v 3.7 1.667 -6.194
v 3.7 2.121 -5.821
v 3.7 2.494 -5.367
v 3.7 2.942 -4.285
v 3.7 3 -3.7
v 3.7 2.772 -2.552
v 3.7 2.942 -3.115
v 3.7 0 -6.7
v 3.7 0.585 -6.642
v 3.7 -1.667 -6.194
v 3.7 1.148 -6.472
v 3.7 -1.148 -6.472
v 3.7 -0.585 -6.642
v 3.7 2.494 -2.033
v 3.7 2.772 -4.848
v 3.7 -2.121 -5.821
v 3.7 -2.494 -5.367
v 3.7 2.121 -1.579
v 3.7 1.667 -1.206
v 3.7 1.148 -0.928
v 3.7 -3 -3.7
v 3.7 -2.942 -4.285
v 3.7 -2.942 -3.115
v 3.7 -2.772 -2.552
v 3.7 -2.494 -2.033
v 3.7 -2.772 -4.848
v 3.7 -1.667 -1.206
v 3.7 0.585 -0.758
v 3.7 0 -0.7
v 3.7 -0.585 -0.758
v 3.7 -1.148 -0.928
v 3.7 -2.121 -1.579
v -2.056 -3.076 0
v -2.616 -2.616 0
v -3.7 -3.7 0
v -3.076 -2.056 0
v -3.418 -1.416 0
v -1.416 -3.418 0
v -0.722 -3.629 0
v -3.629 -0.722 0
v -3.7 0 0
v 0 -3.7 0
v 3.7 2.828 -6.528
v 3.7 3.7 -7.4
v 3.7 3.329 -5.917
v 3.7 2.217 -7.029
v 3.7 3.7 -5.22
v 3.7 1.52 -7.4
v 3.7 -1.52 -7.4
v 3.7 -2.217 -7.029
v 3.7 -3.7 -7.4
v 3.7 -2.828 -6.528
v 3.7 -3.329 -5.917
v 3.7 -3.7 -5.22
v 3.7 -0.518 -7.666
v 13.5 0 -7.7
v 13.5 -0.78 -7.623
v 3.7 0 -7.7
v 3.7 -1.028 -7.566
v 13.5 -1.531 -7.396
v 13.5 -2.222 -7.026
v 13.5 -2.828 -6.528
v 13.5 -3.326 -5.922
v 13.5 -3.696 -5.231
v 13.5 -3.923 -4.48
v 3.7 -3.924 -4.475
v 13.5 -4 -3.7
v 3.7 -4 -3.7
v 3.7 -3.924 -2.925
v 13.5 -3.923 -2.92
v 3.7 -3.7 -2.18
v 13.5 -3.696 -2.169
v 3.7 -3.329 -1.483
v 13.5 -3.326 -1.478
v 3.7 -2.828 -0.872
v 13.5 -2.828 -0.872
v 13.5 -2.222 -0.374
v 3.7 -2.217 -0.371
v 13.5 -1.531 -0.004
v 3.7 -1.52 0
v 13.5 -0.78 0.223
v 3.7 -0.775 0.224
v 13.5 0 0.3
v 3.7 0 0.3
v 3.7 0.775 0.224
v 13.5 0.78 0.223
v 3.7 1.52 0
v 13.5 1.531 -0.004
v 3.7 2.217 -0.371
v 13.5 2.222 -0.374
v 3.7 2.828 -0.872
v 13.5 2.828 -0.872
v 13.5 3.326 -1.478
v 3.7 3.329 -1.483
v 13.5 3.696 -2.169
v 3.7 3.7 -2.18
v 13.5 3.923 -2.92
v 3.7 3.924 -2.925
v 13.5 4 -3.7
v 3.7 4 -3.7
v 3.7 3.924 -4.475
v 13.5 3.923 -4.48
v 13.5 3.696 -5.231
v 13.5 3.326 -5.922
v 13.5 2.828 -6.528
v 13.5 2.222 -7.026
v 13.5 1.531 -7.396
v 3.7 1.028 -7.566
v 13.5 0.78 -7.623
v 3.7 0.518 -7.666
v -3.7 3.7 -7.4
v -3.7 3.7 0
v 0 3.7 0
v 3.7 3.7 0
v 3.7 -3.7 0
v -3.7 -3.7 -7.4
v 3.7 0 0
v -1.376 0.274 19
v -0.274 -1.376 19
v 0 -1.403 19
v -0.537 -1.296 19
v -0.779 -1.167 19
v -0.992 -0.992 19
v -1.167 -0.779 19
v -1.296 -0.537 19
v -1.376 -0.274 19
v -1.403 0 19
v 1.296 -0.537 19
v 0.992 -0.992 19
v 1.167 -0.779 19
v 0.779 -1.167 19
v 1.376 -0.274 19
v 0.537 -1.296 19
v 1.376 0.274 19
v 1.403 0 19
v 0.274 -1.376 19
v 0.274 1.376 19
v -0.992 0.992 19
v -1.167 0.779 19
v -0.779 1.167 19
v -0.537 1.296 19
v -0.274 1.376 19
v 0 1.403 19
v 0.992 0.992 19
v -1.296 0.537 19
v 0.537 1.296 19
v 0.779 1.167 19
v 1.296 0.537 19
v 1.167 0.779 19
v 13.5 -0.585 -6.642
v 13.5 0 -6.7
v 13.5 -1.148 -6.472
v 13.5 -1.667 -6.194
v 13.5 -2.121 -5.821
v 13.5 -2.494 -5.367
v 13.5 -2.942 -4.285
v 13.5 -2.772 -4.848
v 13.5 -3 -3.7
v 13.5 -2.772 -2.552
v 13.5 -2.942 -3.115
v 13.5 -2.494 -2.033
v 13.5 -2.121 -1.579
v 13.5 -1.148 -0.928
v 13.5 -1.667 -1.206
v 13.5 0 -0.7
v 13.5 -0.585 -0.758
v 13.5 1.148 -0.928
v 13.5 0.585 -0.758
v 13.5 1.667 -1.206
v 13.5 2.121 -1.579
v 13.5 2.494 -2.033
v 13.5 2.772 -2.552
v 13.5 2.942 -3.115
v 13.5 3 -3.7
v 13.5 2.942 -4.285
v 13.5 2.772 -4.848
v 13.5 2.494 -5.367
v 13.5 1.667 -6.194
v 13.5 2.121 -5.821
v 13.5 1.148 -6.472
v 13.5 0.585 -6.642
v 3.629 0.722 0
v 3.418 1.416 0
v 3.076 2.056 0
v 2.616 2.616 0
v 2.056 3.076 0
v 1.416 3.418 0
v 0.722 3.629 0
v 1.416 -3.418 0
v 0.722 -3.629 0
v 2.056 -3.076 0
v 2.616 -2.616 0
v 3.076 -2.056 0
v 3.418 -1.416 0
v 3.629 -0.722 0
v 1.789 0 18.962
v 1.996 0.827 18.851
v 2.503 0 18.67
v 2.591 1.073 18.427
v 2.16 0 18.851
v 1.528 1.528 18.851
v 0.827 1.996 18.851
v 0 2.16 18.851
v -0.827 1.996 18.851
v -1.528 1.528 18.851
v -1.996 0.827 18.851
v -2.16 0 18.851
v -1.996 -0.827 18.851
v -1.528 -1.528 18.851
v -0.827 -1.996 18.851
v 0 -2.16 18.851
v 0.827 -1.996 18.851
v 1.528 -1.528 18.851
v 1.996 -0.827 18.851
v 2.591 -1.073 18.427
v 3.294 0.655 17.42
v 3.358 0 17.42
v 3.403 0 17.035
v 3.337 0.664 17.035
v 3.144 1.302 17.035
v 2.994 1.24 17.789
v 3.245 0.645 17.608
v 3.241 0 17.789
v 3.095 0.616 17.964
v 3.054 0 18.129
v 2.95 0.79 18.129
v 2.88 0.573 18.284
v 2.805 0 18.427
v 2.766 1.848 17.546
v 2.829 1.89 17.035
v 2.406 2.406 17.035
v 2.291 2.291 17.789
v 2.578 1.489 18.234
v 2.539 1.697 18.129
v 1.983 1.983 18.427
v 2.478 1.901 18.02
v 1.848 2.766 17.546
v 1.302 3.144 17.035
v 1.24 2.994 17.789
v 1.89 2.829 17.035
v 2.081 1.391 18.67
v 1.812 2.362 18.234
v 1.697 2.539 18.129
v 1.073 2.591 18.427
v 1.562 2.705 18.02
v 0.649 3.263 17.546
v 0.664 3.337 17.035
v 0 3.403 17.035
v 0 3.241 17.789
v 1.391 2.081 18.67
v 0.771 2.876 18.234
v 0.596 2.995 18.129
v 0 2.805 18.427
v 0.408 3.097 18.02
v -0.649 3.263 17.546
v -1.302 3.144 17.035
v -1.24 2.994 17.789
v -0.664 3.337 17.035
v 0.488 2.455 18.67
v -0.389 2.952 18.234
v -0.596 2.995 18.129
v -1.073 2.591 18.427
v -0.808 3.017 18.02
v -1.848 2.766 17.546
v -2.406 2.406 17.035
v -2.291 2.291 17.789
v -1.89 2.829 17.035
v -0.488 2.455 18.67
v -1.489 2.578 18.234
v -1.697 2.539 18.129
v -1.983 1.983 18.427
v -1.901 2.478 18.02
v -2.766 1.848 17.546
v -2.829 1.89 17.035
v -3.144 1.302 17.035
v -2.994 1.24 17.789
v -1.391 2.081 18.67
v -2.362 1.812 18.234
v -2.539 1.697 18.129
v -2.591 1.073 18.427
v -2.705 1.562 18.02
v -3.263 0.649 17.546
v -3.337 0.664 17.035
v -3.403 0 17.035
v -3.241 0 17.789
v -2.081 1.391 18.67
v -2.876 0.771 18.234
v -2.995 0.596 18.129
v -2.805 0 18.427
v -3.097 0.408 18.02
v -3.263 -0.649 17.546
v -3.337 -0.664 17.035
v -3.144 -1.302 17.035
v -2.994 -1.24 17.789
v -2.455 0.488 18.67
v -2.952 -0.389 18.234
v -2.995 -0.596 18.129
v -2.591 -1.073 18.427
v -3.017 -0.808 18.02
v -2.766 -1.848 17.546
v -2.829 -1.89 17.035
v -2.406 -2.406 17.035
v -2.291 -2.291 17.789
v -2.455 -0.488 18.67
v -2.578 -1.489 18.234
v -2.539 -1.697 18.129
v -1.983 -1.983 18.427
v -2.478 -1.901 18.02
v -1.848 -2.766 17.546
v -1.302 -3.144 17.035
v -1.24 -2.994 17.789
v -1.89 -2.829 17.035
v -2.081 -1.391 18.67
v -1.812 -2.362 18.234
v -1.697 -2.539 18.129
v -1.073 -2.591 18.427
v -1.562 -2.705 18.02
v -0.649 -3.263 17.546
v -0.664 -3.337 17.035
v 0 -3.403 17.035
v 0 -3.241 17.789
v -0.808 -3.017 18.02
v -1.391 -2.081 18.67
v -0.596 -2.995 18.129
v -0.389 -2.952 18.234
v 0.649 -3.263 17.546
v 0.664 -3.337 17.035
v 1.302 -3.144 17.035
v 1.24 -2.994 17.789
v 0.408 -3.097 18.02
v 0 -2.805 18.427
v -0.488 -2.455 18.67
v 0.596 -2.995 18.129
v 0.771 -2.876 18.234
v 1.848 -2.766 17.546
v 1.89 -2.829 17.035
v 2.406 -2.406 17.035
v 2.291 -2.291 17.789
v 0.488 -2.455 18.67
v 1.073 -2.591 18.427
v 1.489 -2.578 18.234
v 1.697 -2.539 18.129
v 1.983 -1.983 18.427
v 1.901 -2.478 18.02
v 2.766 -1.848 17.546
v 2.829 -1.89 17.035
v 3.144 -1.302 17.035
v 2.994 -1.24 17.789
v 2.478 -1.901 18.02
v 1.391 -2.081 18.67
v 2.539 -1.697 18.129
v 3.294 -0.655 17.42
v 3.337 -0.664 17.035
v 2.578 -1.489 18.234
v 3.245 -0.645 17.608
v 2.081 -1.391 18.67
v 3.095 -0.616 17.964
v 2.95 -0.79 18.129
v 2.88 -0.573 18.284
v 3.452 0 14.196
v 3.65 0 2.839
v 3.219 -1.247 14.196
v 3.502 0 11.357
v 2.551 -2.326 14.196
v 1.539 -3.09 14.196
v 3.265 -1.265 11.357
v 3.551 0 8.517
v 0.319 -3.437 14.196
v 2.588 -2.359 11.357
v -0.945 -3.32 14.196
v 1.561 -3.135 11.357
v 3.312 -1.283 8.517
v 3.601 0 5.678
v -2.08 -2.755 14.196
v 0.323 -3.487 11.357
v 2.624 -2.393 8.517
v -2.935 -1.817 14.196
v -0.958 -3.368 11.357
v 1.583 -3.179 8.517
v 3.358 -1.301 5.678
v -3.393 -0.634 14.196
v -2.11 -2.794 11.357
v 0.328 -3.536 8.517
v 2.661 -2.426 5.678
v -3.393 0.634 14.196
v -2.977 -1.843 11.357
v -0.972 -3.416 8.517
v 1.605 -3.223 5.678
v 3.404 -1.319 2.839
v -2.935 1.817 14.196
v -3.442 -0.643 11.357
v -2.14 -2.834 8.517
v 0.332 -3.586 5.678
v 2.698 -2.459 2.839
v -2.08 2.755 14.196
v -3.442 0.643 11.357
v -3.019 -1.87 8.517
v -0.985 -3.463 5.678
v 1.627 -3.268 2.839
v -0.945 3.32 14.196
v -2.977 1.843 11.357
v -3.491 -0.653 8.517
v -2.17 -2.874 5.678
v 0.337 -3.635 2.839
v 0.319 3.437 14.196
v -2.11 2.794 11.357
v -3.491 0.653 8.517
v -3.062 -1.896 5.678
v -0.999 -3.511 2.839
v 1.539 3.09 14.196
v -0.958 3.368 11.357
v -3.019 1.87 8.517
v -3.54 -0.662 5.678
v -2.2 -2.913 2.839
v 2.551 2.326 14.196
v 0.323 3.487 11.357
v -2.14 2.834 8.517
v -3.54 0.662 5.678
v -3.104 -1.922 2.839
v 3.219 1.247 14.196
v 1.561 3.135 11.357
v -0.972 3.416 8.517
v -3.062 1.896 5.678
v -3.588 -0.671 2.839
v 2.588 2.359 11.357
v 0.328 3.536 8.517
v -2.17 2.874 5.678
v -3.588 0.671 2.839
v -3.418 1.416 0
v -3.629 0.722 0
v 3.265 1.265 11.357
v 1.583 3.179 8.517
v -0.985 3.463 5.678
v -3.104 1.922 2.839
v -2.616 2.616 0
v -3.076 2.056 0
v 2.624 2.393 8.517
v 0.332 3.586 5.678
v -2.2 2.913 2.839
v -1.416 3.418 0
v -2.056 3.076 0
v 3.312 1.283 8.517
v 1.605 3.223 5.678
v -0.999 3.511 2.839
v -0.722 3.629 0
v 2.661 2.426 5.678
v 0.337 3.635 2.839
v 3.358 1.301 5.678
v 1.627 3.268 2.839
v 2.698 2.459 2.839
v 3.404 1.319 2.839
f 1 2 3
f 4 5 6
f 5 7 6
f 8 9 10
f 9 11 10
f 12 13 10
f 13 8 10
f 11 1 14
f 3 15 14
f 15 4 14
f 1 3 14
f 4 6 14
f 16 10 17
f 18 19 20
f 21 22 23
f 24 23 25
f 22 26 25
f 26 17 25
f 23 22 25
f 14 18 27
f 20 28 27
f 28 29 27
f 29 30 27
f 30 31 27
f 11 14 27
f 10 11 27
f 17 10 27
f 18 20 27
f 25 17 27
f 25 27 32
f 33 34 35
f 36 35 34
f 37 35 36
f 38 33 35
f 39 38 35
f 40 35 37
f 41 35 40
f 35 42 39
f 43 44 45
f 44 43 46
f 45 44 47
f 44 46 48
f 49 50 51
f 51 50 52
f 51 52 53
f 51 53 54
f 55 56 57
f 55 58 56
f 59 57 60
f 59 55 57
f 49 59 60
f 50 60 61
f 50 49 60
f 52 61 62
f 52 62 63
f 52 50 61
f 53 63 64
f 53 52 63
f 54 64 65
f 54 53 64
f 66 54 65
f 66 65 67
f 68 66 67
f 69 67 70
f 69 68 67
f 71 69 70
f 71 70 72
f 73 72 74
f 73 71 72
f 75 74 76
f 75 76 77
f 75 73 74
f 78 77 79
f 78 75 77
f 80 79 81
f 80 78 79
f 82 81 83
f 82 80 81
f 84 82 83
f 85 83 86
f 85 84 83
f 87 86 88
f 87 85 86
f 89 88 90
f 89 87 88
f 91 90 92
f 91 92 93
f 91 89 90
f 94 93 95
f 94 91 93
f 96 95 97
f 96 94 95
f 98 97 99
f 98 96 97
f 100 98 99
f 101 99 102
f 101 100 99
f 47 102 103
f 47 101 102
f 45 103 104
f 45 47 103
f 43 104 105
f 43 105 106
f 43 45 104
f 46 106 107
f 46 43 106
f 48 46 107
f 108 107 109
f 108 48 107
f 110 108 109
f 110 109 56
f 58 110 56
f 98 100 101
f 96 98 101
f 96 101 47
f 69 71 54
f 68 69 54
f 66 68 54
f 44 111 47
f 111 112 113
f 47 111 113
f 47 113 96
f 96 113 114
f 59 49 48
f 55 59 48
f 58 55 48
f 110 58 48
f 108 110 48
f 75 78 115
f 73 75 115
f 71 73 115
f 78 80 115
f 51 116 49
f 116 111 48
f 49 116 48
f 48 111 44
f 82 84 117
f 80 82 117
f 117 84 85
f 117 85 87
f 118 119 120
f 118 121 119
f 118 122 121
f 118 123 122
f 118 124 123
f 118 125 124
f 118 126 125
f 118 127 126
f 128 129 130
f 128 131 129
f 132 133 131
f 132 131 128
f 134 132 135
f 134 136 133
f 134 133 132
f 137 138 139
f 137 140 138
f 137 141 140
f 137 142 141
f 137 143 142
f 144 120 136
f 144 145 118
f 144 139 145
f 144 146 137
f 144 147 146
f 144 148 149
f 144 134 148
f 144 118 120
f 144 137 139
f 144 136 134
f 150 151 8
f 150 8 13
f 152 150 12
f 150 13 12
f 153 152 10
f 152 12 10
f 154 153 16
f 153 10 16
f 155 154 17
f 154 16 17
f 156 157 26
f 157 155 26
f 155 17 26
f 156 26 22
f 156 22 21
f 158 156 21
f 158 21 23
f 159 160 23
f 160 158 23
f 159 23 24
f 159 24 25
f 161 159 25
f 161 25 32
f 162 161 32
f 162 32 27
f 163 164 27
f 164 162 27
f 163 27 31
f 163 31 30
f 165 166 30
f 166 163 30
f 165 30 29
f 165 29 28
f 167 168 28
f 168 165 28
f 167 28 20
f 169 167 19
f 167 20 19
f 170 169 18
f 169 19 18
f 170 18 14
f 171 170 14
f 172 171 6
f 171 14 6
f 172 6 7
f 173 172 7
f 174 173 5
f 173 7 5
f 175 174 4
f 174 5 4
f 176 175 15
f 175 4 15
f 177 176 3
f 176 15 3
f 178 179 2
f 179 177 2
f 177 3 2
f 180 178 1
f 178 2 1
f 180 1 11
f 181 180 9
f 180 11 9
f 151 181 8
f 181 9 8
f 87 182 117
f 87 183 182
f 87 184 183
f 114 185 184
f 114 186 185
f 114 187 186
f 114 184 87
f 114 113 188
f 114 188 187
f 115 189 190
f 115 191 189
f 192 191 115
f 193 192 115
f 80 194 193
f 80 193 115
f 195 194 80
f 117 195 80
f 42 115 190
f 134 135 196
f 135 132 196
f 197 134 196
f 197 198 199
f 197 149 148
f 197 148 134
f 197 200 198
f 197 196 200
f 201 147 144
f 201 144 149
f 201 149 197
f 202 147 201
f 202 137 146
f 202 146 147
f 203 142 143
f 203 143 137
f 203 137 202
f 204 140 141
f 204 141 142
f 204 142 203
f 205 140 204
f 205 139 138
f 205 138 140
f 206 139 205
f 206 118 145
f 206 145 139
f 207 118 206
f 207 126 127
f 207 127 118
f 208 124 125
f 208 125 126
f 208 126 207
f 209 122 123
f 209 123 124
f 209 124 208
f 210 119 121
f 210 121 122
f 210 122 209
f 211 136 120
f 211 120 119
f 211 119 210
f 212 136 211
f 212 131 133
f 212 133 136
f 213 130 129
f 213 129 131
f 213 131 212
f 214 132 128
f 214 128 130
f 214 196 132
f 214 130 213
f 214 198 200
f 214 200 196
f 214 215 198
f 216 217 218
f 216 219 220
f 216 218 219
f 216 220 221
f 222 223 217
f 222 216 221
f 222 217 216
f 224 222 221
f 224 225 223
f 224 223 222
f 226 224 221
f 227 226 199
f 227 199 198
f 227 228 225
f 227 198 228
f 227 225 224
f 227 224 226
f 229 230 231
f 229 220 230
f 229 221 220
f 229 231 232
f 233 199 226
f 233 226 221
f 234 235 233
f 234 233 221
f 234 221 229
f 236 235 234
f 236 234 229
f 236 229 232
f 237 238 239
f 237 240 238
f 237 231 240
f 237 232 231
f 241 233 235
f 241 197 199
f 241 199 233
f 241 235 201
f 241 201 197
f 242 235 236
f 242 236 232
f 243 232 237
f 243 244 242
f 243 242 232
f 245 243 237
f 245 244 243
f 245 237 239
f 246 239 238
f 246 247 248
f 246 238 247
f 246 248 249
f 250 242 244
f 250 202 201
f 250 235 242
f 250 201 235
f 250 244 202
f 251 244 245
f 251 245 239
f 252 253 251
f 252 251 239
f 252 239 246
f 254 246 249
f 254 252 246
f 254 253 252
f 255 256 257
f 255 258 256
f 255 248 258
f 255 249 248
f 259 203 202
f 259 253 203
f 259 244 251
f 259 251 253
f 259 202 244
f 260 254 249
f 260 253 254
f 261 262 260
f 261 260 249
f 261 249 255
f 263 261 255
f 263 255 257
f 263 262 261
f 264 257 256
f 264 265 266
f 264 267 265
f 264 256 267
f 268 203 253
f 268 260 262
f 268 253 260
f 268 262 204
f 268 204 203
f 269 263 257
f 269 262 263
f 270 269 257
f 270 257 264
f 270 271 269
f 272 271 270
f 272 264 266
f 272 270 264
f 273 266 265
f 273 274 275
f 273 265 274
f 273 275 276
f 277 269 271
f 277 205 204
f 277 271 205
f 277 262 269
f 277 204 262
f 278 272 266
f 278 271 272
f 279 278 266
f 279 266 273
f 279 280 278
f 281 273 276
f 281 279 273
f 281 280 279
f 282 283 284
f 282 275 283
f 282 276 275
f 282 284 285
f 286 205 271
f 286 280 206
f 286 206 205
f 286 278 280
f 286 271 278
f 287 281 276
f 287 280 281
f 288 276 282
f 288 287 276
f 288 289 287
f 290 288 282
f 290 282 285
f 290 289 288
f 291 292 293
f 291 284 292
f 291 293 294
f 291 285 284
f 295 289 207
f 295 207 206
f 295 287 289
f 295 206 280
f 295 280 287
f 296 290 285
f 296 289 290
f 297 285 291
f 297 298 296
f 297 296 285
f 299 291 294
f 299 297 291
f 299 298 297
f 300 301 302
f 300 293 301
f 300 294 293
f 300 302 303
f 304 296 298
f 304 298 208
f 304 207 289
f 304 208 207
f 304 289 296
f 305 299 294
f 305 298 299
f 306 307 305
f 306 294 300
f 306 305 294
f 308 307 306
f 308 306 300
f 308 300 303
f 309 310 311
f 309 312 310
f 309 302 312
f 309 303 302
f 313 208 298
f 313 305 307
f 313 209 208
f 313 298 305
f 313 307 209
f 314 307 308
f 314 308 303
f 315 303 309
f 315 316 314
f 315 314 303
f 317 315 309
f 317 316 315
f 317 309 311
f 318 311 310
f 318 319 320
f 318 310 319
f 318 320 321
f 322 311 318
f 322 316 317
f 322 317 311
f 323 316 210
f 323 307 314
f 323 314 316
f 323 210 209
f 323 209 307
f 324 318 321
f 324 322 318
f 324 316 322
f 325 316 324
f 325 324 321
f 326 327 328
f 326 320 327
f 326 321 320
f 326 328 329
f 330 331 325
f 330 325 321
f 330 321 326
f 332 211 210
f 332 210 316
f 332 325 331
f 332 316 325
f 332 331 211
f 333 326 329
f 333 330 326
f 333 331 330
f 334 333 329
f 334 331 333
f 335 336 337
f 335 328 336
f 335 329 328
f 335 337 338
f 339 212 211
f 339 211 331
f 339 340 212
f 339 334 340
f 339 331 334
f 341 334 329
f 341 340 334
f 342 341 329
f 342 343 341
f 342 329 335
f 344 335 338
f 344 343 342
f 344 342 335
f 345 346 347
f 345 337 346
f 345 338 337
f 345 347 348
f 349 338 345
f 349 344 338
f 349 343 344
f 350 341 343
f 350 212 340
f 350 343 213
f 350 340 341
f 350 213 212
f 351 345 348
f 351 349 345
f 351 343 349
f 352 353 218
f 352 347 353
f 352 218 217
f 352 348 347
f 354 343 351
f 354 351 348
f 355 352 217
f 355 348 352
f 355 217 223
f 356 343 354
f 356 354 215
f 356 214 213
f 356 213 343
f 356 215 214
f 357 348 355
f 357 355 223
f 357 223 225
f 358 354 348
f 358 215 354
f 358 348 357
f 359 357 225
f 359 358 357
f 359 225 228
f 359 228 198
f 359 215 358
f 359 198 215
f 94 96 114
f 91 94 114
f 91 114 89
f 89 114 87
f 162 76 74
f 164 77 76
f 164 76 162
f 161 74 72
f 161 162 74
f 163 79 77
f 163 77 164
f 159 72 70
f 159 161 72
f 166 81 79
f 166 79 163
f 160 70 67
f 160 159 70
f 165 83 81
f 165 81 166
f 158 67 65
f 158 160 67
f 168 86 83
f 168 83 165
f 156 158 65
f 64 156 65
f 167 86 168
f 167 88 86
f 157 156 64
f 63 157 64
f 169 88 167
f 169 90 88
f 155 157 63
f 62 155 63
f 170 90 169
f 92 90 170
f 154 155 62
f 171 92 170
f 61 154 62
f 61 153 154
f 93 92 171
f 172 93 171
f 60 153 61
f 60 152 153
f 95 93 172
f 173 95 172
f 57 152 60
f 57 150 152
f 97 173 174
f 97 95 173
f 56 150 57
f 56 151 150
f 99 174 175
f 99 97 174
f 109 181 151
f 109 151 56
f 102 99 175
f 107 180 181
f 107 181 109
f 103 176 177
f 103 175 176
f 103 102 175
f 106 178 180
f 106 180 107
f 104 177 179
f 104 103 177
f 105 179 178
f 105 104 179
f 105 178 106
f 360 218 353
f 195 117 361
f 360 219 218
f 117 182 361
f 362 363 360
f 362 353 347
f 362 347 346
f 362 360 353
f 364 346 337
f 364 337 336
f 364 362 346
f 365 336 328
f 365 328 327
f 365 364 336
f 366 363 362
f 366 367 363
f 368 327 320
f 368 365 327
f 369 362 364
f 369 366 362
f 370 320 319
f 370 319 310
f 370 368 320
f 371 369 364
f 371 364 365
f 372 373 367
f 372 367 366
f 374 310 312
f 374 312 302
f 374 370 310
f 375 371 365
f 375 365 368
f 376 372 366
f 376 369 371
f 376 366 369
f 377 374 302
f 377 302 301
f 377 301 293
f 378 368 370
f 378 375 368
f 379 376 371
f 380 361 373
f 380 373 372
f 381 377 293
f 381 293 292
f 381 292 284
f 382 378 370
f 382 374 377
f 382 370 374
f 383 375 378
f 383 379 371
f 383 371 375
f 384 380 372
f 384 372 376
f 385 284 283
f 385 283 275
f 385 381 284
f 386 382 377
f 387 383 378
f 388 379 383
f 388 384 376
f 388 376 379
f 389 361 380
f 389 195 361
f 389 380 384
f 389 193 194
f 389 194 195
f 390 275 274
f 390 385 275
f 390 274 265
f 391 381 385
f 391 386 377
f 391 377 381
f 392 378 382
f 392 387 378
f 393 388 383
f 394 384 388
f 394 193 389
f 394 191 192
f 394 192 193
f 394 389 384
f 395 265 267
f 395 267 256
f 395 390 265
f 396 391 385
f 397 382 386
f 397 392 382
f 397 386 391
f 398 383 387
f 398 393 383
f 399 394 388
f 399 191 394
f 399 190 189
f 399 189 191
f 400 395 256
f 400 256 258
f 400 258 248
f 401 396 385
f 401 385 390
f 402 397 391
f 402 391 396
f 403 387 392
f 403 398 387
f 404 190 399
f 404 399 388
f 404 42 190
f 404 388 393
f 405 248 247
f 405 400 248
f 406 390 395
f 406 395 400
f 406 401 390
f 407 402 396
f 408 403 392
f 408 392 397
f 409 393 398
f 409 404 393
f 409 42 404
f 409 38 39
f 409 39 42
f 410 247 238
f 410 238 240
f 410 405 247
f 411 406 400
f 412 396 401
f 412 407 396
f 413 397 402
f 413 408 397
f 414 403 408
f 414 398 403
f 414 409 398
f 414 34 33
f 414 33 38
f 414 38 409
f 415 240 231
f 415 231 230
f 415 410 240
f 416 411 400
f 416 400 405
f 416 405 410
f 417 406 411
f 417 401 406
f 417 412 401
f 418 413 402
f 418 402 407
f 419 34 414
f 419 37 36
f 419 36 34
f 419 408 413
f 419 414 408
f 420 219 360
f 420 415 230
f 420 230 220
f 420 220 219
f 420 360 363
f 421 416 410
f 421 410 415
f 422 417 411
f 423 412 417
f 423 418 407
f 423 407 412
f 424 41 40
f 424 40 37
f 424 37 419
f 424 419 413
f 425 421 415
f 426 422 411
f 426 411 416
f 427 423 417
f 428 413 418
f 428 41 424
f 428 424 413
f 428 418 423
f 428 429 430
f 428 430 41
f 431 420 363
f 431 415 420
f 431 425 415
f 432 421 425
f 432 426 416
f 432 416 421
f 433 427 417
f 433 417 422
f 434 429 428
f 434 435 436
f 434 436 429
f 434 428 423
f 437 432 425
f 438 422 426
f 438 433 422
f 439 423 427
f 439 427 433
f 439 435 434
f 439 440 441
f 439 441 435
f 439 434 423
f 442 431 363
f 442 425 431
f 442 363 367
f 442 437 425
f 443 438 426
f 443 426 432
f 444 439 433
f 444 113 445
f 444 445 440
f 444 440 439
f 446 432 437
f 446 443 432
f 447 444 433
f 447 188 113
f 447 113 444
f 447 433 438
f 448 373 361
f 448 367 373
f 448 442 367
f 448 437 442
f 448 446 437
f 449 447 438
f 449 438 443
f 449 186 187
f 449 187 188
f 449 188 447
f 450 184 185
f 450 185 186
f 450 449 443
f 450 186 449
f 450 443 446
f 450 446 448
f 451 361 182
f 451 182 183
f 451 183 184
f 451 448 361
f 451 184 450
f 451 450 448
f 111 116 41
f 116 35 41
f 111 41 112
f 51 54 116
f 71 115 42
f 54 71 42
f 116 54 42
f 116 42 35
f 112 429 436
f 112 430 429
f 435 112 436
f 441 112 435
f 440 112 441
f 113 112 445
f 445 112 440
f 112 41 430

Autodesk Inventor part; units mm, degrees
ref_plane "YZ Plane" through (0, 0, 0) normal (1, 0, 0) x (0, 1, 0)
ref_plane "XZ Plane" through (0, 0, 0) normal (0, 1, 0) x (-1, 0, 0)
ref_plane "XY Plane" through (0, 0, 0) normal (0, 0, 1) x (1, 0, 0)
sketch "Skizze1" plane through (0, 0, 0) normal (0, 0, 1) x (1, 0, 0)
  line L0 (-3.7, 3.7) -> (3.7, 3.7)
  line L1 (3.7, 3.7) -> (3.7, -3.7)
  line L2 (3.7, -3.7) -> (-3.7, -3.7)
  line L3 (-3.7, -3.7) -> (-3.7, 3.7)
  line L4 (0, 5.18) -> (0, -5.18) projected
  line L5 (-5.18, 0) -> (5.18, 0) projected
  point P0 (0, 0)
  dimension "d0" = 7.4
  dimension "d1" = 7.4
extrude "Extrusion1" add sketch "Skizze1" against normal blind 7.4
sketch "Skizze2" plane through (0, 0, 0) normal (0, 0, 1) x (1, 0, 0)
  circle A0 centre (0, 0) radius 3.7
  dimension "d4" = 7.4
extrude "Extrusion2" add sketch "Skizze2" along normal blind 19 draft -1
fillet "Rundung1" radius 2 1 edges at (-3.3684, 0, 19)
sketch "Skizze3" plane through (3.7, -3.7, -7.4) normal (1, 0, 0) x (0, 0, -1)
  line L0 (-7.4, 7.4) -> (-7.4, 3.7) projected
  line L1 (-7.4, 3.7) -> (-7.4, 0) projected
  line L2 (-7.4, 0) -> (0, 0) projected
  line L3 (0, 7.4) -> (0, 0) projected
  line L4 (-7.4, 7.4) -> (0, 7.4) projected
  line L5 (-7.4, 3.7) -> (0, 3.7) construction
  line L6 (0, 7.4) -> (0, 0) construction
  line L7 (-7.4, 0) -> (0, 0) construction
  line L8 (-3.7, 0) -> (-3.7, 7.4) construction
  line L9 (-7.4, 7.4) -> (0, 7.4) construction
  circle A0 centre (-3.7, 3.7) radius 4
  circle A1 centre (-3.7, 3.7) radius 3
  dimension "d8" = 8
  dimension "d9" = 6
extrude "Extrusion3" add sketch "Skizze3" along normal blind 9.8 contours A0 L4 L3 L2 L1 L0 | L0 L1 A0 | A0 L4 | L2 A0 | A0 L3
properties part number "Antenne-Klein" material "Aluminium 6061"
